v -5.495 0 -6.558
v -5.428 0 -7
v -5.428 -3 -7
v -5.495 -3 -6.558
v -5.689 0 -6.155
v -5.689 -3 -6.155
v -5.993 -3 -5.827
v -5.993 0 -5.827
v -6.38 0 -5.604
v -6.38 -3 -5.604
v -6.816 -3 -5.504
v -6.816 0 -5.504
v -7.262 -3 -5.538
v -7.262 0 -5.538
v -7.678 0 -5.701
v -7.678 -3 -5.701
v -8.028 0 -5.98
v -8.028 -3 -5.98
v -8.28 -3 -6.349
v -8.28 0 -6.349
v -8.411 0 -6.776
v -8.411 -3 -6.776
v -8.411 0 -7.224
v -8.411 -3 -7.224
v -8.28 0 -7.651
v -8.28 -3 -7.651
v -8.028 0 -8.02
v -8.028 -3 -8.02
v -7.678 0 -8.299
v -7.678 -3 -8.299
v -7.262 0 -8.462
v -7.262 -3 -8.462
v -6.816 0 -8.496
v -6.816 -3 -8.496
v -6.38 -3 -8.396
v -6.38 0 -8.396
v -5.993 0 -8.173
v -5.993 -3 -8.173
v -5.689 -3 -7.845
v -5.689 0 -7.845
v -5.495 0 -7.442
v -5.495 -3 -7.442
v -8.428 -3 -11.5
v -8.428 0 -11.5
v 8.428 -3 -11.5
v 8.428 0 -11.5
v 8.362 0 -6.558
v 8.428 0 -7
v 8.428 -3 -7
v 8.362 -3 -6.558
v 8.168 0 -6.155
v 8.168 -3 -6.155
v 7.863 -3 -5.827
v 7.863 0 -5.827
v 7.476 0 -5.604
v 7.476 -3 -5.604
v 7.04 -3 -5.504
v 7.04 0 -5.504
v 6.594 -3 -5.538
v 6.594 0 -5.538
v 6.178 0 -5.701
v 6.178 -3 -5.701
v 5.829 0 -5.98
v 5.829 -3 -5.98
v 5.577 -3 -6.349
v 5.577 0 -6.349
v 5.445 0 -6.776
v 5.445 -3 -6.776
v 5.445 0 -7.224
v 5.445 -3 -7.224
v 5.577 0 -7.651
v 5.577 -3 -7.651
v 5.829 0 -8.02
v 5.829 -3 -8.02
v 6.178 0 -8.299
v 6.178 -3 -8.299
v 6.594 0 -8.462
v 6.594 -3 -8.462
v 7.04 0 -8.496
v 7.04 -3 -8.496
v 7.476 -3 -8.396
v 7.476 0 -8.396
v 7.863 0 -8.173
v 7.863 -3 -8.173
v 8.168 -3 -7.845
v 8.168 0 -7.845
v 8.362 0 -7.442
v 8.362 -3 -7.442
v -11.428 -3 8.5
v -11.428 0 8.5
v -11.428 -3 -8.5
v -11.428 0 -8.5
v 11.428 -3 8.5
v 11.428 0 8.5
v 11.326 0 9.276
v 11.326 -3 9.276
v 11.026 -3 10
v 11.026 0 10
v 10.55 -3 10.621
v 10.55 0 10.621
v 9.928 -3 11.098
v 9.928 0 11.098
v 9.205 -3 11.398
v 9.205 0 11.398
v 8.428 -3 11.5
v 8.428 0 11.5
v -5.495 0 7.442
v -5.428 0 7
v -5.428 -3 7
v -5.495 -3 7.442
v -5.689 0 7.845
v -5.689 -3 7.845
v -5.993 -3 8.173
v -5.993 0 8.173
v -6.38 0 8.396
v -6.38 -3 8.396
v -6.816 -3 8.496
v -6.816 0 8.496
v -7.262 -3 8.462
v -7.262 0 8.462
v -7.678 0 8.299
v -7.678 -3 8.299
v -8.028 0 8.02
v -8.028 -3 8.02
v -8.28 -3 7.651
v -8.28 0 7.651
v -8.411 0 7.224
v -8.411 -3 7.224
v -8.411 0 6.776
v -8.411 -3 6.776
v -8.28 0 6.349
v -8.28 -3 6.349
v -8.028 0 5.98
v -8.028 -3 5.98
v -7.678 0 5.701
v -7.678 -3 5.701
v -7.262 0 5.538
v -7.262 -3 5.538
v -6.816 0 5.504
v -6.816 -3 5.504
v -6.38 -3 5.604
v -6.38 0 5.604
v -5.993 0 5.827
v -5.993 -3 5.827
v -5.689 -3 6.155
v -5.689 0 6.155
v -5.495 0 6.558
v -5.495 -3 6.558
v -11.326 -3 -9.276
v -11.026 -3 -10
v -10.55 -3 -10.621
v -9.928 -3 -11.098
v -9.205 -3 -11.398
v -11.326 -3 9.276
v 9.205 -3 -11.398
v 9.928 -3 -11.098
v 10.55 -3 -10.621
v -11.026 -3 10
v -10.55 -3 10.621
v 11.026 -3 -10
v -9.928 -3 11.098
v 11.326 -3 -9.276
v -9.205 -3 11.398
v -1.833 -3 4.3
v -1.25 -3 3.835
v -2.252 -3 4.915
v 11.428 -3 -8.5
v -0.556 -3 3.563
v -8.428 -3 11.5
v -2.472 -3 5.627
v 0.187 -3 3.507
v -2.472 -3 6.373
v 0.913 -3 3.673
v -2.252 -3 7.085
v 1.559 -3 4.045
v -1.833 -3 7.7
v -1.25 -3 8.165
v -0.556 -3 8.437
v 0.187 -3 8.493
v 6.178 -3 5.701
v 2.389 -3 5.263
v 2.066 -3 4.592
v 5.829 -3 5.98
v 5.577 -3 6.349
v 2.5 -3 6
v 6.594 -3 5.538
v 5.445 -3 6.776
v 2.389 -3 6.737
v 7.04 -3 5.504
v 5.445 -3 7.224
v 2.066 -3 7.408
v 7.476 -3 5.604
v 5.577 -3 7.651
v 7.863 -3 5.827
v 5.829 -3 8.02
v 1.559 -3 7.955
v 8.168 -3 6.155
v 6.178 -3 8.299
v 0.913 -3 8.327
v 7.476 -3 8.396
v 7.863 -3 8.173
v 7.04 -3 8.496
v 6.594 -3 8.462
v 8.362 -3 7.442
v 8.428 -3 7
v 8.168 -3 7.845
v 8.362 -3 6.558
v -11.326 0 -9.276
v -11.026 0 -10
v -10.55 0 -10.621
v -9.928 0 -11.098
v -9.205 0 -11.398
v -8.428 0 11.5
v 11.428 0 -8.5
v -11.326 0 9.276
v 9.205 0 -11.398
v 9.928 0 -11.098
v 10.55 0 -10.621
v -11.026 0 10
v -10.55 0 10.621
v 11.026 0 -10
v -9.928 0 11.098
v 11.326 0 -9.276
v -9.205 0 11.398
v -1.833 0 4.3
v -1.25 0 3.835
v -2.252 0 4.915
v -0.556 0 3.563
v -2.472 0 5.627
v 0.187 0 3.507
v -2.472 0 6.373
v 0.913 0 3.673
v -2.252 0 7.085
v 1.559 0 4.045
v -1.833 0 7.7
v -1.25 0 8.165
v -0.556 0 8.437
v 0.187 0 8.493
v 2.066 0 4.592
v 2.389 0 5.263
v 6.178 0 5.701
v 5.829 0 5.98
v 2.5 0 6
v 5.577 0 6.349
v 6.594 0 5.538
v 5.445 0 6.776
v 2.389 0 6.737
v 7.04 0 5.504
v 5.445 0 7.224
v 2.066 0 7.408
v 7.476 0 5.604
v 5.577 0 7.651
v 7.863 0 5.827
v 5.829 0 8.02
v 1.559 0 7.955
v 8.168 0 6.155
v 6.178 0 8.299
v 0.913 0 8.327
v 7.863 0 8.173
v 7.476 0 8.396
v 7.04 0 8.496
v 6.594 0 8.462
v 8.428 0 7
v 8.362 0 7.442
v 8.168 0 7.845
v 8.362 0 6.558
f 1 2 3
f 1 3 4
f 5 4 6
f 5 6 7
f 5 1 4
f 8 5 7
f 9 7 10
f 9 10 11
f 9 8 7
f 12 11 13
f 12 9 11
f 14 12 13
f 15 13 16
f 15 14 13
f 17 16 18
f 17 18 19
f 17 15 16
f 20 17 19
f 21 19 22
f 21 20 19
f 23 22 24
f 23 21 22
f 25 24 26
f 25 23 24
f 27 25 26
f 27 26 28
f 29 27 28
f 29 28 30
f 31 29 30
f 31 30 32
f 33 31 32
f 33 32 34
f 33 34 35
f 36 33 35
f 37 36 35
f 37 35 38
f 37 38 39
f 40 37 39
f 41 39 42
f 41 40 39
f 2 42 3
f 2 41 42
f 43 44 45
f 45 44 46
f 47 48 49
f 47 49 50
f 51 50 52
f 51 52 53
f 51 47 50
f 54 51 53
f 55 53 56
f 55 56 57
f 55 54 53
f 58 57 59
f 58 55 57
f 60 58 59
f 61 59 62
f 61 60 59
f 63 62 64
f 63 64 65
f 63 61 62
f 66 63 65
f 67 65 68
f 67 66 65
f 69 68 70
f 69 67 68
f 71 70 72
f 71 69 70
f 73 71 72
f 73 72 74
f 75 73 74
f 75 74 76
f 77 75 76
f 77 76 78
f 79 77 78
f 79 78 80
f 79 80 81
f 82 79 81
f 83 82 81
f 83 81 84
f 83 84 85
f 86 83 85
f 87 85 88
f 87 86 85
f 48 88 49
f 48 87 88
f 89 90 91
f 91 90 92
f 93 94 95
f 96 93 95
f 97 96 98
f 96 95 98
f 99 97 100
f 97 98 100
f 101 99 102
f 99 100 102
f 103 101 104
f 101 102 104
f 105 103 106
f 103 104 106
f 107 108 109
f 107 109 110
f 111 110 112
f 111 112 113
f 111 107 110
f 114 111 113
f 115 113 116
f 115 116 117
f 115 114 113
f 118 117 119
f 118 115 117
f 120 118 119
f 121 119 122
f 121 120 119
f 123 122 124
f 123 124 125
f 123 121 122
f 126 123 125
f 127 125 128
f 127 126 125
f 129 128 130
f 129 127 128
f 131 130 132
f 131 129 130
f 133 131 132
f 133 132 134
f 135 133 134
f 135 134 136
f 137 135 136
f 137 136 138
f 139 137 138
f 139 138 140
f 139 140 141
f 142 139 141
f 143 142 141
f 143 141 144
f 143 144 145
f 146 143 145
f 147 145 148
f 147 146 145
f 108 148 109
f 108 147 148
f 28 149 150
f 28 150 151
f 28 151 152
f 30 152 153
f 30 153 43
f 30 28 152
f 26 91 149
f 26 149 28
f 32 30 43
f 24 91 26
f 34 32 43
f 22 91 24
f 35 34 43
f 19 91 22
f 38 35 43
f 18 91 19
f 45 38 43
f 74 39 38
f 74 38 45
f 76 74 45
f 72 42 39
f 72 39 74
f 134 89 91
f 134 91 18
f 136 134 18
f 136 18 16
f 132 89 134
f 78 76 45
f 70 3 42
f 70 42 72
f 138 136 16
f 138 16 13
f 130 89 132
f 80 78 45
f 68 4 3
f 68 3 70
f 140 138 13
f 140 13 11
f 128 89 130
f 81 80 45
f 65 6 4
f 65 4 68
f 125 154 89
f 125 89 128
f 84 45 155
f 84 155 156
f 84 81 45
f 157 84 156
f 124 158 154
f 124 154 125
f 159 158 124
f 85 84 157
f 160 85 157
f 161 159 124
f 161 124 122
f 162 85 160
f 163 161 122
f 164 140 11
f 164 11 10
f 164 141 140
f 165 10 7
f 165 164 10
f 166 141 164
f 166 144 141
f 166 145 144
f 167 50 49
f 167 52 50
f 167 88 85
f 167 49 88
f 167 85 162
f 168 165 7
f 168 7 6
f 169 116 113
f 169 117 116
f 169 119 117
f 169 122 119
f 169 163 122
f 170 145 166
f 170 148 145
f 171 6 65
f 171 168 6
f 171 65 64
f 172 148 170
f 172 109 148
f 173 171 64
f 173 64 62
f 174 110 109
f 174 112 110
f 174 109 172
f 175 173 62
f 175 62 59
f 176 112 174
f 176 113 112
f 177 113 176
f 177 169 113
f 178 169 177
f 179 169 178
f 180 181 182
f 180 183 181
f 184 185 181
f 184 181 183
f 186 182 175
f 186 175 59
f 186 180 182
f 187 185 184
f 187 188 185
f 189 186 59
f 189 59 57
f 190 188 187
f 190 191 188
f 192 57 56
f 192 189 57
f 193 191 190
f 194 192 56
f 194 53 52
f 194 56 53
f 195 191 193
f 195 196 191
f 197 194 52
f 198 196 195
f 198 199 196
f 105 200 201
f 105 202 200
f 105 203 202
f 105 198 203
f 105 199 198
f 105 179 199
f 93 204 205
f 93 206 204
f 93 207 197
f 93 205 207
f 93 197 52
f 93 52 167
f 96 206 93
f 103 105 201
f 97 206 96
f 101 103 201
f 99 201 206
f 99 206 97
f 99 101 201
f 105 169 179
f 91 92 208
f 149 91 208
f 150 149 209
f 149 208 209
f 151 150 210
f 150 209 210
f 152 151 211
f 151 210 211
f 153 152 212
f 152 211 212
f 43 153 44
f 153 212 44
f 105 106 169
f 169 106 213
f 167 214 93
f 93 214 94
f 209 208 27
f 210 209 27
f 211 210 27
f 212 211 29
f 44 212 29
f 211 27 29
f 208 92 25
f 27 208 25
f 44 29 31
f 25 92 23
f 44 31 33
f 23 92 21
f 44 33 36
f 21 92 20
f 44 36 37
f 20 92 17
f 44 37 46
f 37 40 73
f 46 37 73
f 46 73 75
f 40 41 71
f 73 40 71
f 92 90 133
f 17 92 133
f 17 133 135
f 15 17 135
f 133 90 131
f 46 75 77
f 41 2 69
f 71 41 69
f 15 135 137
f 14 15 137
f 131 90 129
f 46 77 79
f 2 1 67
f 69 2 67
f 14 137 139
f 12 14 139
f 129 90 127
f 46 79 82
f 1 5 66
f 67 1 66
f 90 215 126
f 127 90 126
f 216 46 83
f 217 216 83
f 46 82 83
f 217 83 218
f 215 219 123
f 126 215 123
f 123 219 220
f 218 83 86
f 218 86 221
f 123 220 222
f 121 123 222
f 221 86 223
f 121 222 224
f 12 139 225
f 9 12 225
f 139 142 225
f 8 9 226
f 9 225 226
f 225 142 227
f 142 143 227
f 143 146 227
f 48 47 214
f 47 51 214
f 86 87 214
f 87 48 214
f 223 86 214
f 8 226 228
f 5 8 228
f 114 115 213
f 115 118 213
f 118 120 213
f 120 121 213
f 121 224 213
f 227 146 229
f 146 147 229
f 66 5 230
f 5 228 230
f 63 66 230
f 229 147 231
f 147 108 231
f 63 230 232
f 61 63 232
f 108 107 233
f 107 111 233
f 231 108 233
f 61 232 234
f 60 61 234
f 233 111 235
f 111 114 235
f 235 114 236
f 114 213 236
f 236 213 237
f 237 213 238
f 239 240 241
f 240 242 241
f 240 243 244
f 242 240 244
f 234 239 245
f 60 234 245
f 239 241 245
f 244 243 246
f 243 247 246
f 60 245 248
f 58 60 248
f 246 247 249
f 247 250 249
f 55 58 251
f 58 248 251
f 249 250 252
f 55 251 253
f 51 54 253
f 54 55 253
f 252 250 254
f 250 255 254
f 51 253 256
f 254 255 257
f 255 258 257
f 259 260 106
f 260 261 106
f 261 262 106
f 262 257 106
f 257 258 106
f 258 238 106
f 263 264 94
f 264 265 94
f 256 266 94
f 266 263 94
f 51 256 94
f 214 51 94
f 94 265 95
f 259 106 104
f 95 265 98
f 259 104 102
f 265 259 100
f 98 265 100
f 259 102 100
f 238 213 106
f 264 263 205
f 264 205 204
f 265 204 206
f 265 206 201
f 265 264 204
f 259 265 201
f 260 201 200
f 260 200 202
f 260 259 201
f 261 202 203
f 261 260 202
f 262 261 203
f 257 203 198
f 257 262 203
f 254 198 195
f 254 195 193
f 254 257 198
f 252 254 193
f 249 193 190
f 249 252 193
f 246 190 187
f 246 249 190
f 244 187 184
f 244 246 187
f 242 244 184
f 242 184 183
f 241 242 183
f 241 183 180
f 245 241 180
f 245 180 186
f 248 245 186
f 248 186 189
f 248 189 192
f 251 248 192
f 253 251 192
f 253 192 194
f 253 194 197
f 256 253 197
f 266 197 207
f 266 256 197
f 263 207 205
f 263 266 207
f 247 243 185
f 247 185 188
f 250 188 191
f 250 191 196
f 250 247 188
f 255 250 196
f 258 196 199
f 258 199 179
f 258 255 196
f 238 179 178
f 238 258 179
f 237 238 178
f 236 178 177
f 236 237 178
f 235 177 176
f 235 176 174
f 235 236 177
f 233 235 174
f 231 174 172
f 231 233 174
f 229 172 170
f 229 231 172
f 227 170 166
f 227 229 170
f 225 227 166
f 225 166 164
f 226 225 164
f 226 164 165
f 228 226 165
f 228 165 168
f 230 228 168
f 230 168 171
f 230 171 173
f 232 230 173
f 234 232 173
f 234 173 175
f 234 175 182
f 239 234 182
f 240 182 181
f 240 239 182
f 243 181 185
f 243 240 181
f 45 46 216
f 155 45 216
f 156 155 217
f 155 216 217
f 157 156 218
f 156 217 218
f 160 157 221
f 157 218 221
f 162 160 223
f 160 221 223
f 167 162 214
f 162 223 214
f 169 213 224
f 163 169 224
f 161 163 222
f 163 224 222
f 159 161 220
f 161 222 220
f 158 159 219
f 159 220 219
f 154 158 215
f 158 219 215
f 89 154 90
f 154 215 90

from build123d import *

# Parameters (mm, degrees)
F0_R     = 1.5
F0_R_2   = 2.5
F1_DEPTH = 3


with BuildPart() as f1:
    # F0 (on Front) → F1 (new body)
    with BuildSketch(Plane.XZ):
        with BuildLine():
            ThreePointArc((-11.428203, -8.5), (-10.549524, -10.62132), (-8.428203, -11.5))
            Line((-8.428203, -11.5), (8.428203, -11.5))
            ThreePointArc((8.428203, -11.5), (10.549524, -10.62132), (11.428203, -8.5))
            Line((11.428203, -8.5), (11.428203, 8.5))
            ThreePointArc((11.428203, 8.5), (10.549524, 10.62132), (8.428203, 11.5))
            Line((8.428203, 11.5), (-8.428203, 11.5))
            ThreePointArc((-8.428203, 11.5), (-10.549524, 10.62132), (-11.428203, 8.5))
            Line((-11.428203, 8.5), (-11.428203, -8.5))
        make_face()
        with Locations((-6.928203, -7)):
            Circle(F0_R, mode=Mode.SUBTRACT)
        with Locations((6.928203, -7)):
            Circle(F0_R, mode=Mode.SUBTRACT)
        with Locations((-6.928203, 7)):
            Circle(F0_R, mode=Mode.SUBTRACT)
        with Locations((0, 6)):
            Circle(F0_R_2, mode=Mode.SUBTRACT)
        with Locations((6.928203, 7)):
            Circle(F0_R, mode=Mode.SUBTRACT)
    extrude(amount=F1_DEPTH)


solid = f1.part
